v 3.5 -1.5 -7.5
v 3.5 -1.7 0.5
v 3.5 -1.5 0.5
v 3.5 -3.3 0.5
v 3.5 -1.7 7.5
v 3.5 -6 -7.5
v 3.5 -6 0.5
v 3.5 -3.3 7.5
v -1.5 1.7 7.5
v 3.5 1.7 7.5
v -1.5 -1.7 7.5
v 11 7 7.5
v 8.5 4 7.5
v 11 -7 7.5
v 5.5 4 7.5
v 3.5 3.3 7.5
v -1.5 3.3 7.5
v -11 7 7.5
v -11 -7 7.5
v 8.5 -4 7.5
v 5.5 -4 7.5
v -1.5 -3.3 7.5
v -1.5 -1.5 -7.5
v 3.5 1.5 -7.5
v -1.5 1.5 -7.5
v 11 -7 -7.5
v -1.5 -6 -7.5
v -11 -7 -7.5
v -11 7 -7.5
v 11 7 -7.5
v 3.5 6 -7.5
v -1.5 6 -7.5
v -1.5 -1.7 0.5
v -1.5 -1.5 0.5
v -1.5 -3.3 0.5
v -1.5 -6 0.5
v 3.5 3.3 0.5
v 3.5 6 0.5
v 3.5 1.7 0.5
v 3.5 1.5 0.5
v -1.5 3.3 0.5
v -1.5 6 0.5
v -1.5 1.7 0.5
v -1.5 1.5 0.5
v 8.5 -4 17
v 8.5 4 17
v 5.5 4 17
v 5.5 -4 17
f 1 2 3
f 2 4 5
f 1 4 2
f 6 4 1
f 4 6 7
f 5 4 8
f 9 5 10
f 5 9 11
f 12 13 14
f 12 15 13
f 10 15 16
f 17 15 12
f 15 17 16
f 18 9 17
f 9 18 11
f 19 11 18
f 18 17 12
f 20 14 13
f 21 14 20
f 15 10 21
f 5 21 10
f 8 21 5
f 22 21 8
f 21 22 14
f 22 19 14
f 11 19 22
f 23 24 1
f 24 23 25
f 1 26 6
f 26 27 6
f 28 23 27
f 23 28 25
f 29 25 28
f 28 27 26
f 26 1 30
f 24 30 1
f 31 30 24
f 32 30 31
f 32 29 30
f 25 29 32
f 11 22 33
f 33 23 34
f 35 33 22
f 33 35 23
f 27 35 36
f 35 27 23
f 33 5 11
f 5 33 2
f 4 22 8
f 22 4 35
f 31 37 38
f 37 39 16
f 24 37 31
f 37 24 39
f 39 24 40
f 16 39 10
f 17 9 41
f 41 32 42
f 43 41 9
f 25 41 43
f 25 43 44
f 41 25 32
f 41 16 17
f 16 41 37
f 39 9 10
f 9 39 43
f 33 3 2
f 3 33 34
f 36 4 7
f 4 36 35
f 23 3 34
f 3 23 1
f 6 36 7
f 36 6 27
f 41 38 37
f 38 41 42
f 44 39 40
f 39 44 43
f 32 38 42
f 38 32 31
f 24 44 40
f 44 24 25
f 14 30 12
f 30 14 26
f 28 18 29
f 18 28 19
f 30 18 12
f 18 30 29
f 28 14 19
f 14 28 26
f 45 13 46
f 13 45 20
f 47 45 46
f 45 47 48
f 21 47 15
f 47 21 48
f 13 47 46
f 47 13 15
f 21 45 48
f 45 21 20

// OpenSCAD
difference() {
    cube([22,14,15], true);
    for(i=[-1,1]) {
        translate([1,i*2.5,0]) {
            cube([5,1.6,15], true);
        }
    }
    for(i=[-1,1]) {
        translate([1,i*3.75,-4.5]) {
            cube([5,4.5,10], true);
        }
    }
}

translate([7,0,12]) {
    cube([3,8,10], true);
}
